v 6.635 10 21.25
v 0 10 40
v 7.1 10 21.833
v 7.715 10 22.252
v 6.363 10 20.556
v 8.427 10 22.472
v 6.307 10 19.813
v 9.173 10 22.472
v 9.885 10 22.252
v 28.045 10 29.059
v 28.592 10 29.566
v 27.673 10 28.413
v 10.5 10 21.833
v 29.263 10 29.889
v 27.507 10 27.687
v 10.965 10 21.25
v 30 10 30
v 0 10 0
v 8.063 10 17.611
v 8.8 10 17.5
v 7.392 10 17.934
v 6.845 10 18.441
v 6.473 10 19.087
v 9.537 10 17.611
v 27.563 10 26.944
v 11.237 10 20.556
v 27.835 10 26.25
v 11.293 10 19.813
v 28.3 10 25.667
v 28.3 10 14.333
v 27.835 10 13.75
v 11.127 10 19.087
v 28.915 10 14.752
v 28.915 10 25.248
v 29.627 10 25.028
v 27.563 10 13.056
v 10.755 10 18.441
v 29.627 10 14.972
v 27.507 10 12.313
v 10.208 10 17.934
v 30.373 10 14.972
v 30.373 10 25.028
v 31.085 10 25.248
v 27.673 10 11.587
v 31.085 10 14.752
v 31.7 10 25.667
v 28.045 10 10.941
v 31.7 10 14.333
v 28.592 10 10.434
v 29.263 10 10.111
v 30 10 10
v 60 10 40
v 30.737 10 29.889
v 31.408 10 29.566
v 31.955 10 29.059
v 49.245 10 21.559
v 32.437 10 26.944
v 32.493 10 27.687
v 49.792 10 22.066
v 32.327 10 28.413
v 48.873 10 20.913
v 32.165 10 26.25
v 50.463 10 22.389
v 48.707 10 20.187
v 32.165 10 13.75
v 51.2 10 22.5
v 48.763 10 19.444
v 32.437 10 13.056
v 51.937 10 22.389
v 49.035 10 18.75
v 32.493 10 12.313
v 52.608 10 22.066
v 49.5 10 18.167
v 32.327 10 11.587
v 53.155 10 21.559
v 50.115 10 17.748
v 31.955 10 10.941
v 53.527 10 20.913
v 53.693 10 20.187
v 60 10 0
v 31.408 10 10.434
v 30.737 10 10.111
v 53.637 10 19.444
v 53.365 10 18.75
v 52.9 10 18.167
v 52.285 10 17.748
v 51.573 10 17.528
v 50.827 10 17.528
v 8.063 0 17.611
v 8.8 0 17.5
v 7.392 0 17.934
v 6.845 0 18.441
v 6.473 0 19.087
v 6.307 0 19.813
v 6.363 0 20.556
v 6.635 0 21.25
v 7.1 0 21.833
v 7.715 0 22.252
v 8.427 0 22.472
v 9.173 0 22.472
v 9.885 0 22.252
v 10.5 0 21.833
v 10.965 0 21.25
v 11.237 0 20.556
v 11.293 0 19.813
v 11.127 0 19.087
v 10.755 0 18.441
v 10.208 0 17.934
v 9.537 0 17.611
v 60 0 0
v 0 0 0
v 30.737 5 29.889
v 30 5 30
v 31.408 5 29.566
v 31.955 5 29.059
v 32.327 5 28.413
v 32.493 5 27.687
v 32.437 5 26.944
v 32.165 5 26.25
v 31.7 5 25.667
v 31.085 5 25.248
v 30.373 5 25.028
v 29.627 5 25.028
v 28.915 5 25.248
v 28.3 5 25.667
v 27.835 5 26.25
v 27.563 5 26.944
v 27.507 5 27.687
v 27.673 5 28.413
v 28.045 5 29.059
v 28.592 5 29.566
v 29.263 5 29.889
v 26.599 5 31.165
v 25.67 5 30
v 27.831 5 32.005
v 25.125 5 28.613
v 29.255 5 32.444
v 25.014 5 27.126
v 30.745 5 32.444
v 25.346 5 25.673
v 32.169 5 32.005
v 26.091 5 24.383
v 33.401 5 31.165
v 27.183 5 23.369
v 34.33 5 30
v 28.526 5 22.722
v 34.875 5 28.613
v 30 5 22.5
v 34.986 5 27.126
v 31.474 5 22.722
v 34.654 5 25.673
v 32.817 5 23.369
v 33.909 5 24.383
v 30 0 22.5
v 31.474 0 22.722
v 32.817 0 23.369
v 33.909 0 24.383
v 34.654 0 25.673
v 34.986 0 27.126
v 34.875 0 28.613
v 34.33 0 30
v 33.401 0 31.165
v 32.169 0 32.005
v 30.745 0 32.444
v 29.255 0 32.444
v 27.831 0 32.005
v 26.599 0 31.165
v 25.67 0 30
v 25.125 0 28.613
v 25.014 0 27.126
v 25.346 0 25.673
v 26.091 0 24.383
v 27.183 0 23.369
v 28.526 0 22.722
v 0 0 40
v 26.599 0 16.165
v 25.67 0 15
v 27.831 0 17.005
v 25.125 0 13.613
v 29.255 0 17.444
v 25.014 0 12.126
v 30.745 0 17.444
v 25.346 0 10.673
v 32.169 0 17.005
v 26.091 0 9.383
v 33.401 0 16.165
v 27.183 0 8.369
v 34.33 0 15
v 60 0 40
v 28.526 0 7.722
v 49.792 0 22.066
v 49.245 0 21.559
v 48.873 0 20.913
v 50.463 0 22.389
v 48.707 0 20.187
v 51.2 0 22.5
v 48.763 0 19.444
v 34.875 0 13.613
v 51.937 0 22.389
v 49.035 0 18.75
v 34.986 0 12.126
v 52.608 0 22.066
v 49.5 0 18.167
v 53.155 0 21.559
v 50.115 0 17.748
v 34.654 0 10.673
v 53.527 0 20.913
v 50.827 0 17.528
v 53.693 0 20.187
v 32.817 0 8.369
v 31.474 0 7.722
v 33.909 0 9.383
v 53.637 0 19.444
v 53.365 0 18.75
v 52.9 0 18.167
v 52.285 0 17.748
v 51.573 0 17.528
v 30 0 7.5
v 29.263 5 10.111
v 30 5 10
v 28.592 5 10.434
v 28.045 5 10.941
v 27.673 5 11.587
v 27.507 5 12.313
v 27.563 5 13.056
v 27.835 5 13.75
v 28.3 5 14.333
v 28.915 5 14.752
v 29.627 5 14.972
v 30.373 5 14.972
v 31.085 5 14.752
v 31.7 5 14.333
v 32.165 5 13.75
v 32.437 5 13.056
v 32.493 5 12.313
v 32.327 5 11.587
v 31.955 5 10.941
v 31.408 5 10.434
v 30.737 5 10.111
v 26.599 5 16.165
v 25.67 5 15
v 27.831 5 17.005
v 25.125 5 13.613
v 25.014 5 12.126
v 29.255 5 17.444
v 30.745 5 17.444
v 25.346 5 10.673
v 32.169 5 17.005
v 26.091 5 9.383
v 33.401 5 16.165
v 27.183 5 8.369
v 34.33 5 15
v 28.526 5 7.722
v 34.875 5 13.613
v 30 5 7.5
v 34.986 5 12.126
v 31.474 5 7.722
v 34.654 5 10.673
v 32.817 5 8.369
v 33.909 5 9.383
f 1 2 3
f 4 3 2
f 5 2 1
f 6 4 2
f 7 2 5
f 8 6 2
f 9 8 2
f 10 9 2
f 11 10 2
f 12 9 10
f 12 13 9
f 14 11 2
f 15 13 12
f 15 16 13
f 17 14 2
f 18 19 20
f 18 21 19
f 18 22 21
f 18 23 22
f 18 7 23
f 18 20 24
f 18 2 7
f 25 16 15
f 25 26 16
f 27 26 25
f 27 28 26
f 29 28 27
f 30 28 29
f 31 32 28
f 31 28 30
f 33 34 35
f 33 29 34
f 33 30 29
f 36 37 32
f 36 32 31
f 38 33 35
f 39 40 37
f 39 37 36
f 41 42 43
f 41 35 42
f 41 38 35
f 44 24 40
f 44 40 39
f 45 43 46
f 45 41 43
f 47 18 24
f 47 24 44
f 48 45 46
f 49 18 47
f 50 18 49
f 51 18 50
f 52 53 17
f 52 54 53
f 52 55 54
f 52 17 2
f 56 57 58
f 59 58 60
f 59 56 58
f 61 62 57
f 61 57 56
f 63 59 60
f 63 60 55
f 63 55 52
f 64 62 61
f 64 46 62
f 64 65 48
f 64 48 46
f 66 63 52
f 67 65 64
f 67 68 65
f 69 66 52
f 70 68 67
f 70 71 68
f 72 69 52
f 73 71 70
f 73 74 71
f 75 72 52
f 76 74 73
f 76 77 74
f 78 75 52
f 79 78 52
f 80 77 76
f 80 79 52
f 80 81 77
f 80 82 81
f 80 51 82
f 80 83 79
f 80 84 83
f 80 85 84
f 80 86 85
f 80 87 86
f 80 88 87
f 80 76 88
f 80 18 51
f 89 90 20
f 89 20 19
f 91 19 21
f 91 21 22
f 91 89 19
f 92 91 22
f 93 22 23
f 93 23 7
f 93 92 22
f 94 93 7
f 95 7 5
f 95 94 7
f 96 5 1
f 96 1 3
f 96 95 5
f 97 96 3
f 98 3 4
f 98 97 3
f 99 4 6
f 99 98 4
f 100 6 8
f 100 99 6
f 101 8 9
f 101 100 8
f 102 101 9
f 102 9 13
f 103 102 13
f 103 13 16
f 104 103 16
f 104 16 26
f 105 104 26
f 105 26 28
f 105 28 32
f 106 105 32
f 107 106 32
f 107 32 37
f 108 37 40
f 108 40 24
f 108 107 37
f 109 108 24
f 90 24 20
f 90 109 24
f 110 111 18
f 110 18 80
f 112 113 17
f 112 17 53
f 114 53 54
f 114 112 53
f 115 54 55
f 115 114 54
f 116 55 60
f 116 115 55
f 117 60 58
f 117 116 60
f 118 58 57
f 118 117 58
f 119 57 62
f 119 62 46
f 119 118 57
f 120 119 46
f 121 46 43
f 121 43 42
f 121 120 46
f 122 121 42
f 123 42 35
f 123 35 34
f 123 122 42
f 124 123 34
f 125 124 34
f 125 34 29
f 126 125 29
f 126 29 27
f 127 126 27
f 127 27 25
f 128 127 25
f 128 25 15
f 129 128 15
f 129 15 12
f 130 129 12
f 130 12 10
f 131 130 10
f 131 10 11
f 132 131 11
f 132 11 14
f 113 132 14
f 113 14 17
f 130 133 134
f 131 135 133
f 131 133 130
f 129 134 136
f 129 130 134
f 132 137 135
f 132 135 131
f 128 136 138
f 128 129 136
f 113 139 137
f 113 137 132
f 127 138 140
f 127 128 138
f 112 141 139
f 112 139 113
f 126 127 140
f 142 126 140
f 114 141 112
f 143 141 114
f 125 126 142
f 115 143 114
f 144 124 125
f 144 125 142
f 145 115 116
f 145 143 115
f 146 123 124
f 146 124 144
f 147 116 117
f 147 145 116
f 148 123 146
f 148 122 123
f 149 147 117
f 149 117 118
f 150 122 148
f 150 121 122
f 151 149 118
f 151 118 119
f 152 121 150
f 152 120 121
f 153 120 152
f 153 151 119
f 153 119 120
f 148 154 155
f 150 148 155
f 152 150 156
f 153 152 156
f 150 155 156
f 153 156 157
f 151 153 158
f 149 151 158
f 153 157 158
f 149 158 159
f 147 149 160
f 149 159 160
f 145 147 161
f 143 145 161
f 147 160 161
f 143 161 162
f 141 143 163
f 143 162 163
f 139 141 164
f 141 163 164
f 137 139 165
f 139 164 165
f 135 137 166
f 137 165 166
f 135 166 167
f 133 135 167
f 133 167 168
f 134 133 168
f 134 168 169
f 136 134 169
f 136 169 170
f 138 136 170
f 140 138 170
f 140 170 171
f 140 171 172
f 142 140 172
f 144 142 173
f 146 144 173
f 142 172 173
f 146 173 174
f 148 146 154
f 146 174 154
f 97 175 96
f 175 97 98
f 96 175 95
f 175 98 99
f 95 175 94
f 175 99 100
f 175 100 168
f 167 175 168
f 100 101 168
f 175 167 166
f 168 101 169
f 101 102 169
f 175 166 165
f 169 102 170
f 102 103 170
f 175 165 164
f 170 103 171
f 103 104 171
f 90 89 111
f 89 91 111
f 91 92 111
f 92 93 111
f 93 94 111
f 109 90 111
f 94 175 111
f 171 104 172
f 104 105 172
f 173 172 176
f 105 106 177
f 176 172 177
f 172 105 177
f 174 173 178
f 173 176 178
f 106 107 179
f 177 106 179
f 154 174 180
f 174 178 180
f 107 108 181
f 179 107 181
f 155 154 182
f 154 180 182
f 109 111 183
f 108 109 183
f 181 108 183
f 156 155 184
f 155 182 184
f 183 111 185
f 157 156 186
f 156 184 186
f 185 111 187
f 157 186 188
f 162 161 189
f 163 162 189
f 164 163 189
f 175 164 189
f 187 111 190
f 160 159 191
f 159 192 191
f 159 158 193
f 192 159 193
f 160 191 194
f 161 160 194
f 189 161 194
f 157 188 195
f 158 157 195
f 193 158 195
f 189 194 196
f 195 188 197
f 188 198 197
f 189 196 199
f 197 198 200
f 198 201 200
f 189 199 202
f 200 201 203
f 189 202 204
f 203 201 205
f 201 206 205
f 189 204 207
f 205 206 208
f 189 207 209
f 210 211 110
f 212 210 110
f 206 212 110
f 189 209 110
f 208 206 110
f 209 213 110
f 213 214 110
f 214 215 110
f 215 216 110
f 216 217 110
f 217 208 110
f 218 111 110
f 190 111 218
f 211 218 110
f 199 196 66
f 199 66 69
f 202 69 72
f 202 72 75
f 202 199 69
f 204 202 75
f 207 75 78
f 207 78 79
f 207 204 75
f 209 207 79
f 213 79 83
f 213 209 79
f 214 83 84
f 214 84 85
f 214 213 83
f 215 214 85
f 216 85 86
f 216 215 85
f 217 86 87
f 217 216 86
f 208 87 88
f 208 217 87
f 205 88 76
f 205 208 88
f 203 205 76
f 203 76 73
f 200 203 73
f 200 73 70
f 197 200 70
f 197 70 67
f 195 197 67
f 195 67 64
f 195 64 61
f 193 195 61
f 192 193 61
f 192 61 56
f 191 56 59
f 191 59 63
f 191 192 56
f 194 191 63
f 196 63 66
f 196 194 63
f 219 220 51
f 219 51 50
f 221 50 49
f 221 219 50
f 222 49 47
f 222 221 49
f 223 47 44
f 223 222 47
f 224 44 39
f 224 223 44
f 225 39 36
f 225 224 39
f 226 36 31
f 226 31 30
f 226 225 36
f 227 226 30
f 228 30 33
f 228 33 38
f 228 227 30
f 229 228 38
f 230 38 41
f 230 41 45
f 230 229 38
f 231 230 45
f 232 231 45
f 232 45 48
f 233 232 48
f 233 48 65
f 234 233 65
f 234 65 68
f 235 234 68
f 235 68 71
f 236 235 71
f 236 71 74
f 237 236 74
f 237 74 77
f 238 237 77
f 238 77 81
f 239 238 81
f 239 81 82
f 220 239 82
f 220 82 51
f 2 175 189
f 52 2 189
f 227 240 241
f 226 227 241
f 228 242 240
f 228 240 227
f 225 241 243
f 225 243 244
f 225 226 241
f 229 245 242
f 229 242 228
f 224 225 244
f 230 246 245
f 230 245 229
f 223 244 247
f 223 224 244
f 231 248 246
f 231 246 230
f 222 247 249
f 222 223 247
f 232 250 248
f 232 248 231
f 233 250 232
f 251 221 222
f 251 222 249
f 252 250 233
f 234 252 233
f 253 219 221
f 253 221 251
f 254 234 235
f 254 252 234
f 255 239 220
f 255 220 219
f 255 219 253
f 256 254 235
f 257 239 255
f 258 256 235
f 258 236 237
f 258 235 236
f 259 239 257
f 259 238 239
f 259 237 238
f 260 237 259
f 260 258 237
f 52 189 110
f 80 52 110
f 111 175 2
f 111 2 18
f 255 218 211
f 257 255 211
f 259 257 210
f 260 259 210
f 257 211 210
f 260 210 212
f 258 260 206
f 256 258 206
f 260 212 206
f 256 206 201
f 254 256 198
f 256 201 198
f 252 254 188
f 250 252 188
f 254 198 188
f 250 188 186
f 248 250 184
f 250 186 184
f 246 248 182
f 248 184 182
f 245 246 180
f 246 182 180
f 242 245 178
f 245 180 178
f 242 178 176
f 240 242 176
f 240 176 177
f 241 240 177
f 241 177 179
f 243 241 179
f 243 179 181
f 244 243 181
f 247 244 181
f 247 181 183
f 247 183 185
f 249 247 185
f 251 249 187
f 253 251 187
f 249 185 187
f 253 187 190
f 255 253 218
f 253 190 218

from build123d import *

# Parameters (mm, degrees)
SKETCH1_W           = 60
SKETCH1_H           = 40
SKETCH1_R           = 2.5
BOSS_EXTRUDE1_DEPTH = 10
SKETCH4_R           = 5
CUT_EXTRUDE1_DEPTH  = 5


with BuildPart() as part:
    # Sketch1 → Boss-Extrude1 (new body)
    with BuildSketch(Plane(origin=(0, 0, 0), x_dir=(1, 0, 0), z_dir=(0, 1, 0))):
        with Locations((30, -20)):
            Rectangle(SKETCH1_W, SKETCH1_H)
        with Locations(Location((51.2, -20, 0), (0, 0, 270))):
            Circle(SKETCH1_R, mode=Mode.SUBTRACT)
        with Locations(Location((8.8, -20, 0), (0, 0, 90))):
            Circle(SKETCH1_R, mode=Mode.SUBTRACT)
        with Locations(Location((30, -27.5, 0), (0, 0, 270))):
            Circle(SKETCH1_R, mode=Mode.SUBTRACT)
        with Locations(Location((30, -12.5, 0), (0, 0, 90))):
            Circle(SKETCH1_R, mode=Mode.SUBTRACT)
    extrude(amount=BOSS_EXTRUDE1_DEPTH)

    # Sketch4 → Cut-Extrude1 (cut)
    with BuildSketch(Plane.XZ):
        with Locations(Location((30, 27.5, 0), (0, 0, 270))):
            Circle(SKETCH4_R)
        with Locations(Location((30, 12.5, 0), (0, 0, 270))):
            Circle(SKETCH4_R)
    extrude(amount=-CUT_EXTRUDE1_DEPTH, mode=Mode.SUBTRACT)


solid = part.part
